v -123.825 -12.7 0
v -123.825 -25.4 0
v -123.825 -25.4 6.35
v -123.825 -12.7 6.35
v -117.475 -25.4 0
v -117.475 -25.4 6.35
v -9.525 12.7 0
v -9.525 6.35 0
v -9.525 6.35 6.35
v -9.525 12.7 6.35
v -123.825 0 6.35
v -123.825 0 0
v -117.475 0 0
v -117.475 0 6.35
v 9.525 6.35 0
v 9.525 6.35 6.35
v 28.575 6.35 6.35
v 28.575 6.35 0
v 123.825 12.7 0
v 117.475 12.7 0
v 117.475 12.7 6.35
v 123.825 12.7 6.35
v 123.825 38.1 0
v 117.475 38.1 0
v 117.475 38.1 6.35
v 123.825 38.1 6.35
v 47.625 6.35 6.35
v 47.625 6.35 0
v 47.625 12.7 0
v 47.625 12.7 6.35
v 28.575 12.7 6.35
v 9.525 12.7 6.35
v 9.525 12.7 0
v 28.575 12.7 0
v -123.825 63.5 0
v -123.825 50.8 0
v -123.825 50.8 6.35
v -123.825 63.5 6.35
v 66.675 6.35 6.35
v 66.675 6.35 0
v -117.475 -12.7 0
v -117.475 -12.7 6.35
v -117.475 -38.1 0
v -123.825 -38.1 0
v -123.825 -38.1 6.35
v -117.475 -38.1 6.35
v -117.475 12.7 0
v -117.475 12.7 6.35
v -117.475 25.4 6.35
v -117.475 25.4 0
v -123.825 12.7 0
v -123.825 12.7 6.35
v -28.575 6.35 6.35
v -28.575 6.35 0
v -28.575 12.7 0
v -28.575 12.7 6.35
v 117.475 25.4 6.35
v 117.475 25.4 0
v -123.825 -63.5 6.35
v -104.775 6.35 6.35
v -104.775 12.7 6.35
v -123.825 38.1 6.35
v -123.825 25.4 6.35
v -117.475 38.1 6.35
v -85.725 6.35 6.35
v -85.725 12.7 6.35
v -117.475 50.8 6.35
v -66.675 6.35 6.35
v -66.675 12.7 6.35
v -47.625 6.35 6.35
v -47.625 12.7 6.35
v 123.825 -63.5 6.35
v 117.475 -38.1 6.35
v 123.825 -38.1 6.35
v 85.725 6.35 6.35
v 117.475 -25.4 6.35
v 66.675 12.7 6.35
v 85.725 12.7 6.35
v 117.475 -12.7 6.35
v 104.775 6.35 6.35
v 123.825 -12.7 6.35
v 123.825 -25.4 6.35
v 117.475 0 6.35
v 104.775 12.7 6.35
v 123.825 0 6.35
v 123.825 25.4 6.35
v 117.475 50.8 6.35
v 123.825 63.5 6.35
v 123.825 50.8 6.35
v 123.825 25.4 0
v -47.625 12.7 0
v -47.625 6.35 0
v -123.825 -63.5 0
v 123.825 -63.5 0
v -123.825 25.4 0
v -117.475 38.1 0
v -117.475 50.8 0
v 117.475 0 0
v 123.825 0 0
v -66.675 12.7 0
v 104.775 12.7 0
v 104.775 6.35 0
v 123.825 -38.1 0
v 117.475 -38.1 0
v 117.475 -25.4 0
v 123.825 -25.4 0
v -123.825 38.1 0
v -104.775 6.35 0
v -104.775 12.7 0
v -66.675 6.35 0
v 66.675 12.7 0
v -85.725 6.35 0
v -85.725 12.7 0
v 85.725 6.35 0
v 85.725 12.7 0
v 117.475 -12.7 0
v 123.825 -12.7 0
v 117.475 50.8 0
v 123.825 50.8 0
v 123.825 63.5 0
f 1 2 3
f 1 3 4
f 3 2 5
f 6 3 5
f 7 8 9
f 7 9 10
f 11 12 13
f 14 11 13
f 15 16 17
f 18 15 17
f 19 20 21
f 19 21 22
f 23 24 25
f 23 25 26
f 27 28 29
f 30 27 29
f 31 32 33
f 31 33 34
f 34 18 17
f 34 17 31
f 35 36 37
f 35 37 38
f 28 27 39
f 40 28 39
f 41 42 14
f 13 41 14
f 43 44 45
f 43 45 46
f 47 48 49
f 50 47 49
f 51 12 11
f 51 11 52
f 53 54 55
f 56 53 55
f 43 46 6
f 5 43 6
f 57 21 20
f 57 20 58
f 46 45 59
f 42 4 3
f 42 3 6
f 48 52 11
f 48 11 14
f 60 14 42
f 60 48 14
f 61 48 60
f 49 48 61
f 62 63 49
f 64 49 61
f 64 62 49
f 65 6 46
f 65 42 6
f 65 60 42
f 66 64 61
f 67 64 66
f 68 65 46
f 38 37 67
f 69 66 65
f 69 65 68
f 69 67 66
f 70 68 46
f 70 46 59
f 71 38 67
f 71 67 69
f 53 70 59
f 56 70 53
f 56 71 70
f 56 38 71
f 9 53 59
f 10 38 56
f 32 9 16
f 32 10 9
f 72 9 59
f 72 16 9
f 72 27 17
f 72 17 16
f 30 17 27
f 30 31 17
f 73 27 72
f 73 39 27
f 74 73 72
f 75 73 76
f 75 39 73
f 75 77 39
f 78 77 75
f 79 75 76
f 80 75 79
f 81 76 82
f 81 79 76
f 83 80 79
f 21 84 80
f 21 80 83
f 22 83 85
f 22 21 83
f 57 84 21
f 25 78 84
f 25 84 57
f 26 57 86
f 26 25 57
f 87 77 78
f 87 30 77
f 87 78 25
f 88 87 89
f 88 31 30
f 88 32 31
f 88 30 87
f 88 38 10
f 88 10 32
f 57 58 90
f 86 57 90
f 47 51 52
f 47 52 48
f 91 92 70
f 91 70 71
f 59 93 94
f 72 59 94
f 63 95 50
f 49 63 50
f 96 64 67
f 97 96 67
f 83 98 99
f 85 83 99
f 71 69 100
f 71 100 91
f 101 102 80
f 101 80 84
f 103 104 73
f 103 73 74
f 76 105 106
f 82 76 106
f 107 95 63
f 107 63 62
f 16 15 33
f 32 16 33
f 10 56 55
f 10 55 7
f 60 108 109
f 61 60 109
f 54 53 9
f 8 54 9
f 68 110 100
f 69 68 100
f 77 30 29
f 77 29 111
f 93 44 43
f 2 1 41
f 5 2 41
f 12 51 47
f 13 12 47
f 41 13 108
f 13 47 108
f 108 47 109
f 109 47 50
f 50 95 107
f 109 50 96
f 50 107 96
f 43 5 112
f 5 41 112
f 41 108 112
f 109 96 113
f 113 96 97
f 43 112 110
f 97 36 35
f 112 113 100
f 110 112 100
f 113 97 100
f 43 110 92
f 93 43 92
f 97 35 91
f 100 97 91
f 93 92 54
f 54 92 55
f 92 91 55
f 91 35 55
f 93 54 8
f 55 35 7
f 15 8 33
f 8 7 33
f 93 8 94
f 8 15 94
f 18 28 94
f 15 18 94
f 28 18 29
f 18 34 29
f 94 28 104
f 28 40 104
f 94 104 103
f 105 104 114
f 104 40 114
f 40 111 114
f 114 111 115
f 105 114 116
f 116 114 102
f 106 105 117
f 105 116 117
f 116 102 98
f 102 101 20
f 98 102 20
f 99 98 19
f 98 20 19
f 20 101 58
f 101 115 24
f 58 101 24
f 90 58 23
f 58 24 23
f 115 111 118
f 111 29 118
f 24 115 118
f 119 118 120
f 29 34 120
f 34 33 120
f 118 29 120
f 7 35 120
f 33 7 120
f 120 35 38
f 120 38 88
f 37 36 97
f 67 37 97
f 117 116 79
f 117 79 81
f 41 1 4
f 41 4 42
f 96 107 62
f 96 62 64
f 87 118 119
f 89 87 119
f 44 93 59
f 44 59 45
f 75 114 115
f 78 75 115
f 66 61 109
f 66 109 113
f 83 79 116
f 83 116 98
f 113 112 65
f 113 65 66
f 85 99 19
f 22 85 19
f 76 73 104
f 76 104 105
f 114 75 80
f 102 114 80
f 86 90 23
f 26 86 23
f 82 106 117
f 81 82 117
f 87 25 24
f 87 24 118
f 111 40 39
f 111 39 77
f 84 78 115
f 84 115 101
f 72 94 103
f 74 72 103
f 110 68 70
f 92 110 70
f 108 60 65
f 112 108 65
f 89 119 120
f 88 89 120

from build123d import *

# Parameters (mm, degrees)
ESQUISSE1_W                     = 247.65
ESQUISSE1_H                     = 127
BOSS_EXTRU_1_DEPTH              = 6.35
ESQUISSE2_W                     = 19.05
ESQUISSE2_H                     = 6.35
ENL_V_MAT_EXTRU_1_DEPTH         = 6.35
R_P_TITION_LIN_AIRE1_COUNT      = 6
R_P_TITION_LIN_AIRE1_PITCH      = 38.1
R_P_TITION_LIN_AIRE1_COUNT_DIR2 = 2
R_P_TITION_LIN_AIRE1_PITCH_DIR2 = 57.15
ESQUISSE3_W                     = 6.35
ESQUISSE3_H                     = 12.7
ENL_V_MAT_EXTRU_2_DEPTH         = 6.35
R_P_TITION_LIN_AIRE2_COUNT      = 4
R_P_TITION_LIN_AIRE2_PITCH      = 25.4
R_P_TITION_LIN_AIRE2_COUNT_DIR2 = 2
R_P_TITION_LIN_AIRE2_PITCH_DIR2 = 241.3


with BuildPart() as part:
    # Esquisse1 → Boss.-Extru.1 (new body)
    with BuildSketch(Plane.XY):
        Rectangle(ESQUISSE1_W, ESQUISSE1_H)
    extrude(amount=BOSS_EXTRU_1_DEPTH)

    # Esquisse2 → Enlèv. mat.-Extru.1 (cut)
    with BuildSketch(Plane.XY.offset(6.35)):
        with Locations((-95.25, 9.525)):
            Rectangle(ESQUISSE2_W, ESQUISSE2_H)
    enl_v_mat_extru_1 = extrude(amount=-ENL_V_MAT_EXTRU_1_DEPTH, mode=Mode.SUBTRACT)

    # Répétition linéaire1: Enl_v. mat.-Extru.1 6 × 2
    with Locations(*[(i * R_P_TITION_LIN_AIRE1_PITCH, j * R_P_TITION_LIN_AIRE1_PITCH_DIR2, 0) for i in range(R_P_TITION_LIN_AIRE1_COUNT) for j in range(R_P_TITION_LIN_AIRE1_COUNT_DIR2) if (i, j) != (0, 0)]):
        add(enl_v_mat_extru_1, mode=Mode.SUBTRACT)

    # Esquisse3 → Enlèv. mat.-Extru.2 (cut)
    with BuildSketch(Plane.XY.offset(6.35)):
        with Locations((-120.65, 44.45)):
            Rectangle(ESQUISSE3_W, ESQUISSE3_H)
    enl_v_mat_extru_2 = extrude(amount=-ENL_V_MAT_EXTRU_2_DEPTH, mode=Mode.SUBTRACT)

    # Répétition linéaire2: Enl_v. mat.-Extru.2 4 × 2
    with Locations(*[(j * R_P_TITION_LIN_AIRE2_PITCH_DIR2, -i * R_P_TITION_LIN_AIRE2_PITCH, 0) for i in range(R_P_TITION_LIN_AIRE2_COUNT) for j in range(R_P_TITION_LIN_AIRE2_COUNT_DIR2) if (i, j) != (0, 0)]):
        add(enl_v_mat_extru_2, mode=Mode.SUBTRACT)


solid = part.part
